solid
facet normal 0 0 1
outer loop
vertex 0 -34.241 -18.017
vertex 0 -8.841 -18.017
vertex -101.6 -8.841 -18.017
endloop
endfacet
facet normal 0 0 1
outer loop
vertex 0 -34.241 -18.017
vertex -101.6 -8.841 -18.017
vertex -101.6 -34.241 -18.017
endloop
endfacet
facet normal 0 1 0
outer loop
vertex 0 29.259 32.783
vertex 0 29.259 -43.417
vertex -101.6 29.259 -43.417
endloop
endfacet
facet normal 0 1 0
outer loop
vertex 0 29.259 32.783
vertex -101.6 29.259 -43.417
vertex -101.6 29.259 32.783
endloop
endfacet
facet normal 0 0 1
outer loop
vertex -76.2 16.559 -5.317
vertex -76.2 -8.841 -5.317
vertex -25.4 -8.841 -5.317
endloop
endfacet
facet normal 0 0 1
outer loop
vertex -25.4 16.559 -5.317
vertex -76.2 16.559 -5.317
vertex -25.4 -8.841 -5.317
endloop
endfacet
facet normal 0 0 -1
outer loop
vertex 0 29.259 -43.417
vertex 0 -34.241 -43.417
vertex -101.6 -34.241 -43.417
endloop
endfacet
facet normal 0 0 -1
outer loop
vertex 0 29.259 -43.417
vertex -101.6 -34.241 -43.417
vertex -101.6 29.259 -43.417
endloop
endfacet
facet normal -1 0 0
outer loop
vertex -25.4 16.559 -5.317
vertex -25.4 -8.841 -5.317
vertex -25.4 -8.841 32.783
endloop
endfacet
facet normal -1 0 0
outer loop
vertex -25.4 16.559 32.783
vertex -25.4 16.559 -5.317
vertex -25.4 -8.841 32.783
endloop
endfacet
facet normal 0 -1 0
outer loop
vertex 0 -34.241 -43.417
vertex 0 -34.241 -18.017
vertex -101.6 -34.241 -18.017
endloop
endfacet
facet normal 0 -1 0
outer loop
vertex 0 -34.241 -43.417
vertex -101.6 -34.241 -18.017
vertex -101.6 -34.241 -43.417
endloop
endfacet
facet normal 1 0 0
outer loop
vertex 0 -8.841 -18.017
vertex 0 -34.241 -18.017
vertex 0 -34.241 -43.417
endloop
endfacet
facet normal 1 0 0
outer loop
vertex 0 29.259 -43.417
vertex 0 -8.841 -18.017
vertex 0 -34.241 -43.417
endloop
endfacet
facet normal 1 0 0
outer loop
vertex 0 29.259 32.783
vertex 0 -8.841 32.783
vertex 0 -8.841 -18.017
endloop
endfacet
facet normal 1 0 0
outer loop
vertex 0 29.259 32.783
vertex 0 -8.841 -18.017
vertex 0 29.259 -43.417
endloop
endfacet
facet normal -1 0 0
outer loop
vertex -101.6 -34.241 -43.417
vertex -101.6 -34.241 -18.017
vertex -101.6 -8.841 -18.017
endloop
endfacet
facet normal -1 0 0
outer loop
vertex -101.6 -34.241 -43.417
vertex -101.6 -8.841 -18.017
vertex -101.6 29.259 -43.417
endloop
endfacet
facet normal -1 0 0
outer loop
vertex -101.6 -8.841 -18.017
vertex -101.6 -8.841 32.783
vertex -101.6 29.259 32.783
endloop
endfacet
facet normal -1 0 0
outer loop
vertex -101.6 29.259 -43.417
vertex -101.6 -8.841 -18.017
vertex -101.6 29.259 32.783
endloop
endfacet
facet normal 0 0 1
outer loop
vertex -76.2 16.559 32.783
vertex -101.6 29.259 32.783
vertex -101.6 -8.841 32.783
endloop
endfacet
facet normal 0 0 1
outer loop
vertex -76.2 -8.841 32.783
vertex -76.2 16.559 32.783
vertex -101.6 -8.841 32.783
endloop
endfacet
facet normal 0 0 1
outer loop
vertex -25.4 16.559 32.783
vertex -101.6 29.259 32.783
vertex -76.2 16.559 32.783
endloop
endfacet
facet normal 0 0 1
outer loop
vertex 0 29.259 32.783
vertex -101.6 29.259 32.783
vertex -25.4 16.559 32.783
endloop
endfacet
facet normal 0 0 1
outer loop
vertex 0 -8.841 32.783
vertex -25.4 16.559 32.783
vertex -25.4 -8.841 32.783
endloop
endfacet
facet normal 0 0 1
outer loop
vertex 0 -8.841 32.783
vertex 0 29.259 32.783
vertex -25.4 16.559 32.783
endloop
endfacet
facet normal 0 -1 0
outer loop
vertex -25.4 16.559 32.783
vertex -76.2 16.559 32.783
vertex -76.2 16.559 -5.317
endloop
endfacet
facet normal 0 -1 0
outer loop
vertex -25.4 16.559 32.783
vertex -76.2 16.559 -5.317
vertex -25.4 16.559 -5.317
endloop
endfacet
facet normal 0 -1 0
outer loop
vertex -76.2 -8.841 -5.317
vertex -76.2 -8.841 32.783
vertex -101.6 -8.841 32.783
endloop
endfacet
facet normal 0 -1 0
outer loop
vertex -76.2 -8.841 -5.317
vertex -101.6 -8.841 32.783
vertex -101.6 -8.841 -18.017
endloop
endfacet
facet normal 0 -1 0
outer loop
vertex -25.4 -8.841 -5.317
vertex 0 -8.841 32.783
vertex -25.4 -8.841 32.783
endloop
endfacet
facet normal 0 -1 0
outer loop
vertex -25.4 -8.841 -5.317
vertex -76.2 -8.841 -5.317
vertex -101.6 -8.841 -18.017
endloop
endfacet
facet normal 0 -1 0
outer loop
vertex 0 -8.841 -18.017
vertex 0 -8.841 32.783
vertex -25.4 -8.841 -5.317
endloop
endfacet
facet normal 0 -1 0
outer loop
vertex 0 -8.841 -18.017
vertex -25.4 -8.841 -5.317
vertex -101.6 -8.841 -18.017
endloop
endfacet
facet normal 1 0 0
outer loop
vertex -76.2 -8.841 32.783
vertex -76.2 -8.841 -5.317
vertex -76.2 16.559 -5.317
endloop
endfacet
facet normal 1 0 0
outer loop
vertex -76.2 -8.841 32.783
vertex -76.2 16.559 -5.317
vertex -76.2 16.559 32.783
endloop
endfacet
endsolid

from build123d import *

# Parameters (mm, degrees)
F1_DEPTH = 101.6
F2_W     = 50.8
F2_H     = 38.1
F3_DEPTH = 25.4


with BuildPart() as f1:
    # F0 (on Right) → F1 (new body)
    with BuildSketch(Plane.YZ):
        Polygon((-34.241207, -18.016895), (-34.241207, -43.416895), (29.258793, -43.416895), (29.258793, 32.783105), (-8.841207, 32.783105), (-8.841207, -18.016895), align=None)
    extrude(amount=-F1_DEPTH)

    # F2 (on face) → F3 (cut)
    with BuildSketch(Plane.XZ.offset(8.841207)):
        with Locations((-50.8, 13.733105)):
            Rectangle(F2_W, F2_H)
    extrude(amount=-F3_DEPTH, mode=Mode.SUBTRACT)


solid = f1.part
